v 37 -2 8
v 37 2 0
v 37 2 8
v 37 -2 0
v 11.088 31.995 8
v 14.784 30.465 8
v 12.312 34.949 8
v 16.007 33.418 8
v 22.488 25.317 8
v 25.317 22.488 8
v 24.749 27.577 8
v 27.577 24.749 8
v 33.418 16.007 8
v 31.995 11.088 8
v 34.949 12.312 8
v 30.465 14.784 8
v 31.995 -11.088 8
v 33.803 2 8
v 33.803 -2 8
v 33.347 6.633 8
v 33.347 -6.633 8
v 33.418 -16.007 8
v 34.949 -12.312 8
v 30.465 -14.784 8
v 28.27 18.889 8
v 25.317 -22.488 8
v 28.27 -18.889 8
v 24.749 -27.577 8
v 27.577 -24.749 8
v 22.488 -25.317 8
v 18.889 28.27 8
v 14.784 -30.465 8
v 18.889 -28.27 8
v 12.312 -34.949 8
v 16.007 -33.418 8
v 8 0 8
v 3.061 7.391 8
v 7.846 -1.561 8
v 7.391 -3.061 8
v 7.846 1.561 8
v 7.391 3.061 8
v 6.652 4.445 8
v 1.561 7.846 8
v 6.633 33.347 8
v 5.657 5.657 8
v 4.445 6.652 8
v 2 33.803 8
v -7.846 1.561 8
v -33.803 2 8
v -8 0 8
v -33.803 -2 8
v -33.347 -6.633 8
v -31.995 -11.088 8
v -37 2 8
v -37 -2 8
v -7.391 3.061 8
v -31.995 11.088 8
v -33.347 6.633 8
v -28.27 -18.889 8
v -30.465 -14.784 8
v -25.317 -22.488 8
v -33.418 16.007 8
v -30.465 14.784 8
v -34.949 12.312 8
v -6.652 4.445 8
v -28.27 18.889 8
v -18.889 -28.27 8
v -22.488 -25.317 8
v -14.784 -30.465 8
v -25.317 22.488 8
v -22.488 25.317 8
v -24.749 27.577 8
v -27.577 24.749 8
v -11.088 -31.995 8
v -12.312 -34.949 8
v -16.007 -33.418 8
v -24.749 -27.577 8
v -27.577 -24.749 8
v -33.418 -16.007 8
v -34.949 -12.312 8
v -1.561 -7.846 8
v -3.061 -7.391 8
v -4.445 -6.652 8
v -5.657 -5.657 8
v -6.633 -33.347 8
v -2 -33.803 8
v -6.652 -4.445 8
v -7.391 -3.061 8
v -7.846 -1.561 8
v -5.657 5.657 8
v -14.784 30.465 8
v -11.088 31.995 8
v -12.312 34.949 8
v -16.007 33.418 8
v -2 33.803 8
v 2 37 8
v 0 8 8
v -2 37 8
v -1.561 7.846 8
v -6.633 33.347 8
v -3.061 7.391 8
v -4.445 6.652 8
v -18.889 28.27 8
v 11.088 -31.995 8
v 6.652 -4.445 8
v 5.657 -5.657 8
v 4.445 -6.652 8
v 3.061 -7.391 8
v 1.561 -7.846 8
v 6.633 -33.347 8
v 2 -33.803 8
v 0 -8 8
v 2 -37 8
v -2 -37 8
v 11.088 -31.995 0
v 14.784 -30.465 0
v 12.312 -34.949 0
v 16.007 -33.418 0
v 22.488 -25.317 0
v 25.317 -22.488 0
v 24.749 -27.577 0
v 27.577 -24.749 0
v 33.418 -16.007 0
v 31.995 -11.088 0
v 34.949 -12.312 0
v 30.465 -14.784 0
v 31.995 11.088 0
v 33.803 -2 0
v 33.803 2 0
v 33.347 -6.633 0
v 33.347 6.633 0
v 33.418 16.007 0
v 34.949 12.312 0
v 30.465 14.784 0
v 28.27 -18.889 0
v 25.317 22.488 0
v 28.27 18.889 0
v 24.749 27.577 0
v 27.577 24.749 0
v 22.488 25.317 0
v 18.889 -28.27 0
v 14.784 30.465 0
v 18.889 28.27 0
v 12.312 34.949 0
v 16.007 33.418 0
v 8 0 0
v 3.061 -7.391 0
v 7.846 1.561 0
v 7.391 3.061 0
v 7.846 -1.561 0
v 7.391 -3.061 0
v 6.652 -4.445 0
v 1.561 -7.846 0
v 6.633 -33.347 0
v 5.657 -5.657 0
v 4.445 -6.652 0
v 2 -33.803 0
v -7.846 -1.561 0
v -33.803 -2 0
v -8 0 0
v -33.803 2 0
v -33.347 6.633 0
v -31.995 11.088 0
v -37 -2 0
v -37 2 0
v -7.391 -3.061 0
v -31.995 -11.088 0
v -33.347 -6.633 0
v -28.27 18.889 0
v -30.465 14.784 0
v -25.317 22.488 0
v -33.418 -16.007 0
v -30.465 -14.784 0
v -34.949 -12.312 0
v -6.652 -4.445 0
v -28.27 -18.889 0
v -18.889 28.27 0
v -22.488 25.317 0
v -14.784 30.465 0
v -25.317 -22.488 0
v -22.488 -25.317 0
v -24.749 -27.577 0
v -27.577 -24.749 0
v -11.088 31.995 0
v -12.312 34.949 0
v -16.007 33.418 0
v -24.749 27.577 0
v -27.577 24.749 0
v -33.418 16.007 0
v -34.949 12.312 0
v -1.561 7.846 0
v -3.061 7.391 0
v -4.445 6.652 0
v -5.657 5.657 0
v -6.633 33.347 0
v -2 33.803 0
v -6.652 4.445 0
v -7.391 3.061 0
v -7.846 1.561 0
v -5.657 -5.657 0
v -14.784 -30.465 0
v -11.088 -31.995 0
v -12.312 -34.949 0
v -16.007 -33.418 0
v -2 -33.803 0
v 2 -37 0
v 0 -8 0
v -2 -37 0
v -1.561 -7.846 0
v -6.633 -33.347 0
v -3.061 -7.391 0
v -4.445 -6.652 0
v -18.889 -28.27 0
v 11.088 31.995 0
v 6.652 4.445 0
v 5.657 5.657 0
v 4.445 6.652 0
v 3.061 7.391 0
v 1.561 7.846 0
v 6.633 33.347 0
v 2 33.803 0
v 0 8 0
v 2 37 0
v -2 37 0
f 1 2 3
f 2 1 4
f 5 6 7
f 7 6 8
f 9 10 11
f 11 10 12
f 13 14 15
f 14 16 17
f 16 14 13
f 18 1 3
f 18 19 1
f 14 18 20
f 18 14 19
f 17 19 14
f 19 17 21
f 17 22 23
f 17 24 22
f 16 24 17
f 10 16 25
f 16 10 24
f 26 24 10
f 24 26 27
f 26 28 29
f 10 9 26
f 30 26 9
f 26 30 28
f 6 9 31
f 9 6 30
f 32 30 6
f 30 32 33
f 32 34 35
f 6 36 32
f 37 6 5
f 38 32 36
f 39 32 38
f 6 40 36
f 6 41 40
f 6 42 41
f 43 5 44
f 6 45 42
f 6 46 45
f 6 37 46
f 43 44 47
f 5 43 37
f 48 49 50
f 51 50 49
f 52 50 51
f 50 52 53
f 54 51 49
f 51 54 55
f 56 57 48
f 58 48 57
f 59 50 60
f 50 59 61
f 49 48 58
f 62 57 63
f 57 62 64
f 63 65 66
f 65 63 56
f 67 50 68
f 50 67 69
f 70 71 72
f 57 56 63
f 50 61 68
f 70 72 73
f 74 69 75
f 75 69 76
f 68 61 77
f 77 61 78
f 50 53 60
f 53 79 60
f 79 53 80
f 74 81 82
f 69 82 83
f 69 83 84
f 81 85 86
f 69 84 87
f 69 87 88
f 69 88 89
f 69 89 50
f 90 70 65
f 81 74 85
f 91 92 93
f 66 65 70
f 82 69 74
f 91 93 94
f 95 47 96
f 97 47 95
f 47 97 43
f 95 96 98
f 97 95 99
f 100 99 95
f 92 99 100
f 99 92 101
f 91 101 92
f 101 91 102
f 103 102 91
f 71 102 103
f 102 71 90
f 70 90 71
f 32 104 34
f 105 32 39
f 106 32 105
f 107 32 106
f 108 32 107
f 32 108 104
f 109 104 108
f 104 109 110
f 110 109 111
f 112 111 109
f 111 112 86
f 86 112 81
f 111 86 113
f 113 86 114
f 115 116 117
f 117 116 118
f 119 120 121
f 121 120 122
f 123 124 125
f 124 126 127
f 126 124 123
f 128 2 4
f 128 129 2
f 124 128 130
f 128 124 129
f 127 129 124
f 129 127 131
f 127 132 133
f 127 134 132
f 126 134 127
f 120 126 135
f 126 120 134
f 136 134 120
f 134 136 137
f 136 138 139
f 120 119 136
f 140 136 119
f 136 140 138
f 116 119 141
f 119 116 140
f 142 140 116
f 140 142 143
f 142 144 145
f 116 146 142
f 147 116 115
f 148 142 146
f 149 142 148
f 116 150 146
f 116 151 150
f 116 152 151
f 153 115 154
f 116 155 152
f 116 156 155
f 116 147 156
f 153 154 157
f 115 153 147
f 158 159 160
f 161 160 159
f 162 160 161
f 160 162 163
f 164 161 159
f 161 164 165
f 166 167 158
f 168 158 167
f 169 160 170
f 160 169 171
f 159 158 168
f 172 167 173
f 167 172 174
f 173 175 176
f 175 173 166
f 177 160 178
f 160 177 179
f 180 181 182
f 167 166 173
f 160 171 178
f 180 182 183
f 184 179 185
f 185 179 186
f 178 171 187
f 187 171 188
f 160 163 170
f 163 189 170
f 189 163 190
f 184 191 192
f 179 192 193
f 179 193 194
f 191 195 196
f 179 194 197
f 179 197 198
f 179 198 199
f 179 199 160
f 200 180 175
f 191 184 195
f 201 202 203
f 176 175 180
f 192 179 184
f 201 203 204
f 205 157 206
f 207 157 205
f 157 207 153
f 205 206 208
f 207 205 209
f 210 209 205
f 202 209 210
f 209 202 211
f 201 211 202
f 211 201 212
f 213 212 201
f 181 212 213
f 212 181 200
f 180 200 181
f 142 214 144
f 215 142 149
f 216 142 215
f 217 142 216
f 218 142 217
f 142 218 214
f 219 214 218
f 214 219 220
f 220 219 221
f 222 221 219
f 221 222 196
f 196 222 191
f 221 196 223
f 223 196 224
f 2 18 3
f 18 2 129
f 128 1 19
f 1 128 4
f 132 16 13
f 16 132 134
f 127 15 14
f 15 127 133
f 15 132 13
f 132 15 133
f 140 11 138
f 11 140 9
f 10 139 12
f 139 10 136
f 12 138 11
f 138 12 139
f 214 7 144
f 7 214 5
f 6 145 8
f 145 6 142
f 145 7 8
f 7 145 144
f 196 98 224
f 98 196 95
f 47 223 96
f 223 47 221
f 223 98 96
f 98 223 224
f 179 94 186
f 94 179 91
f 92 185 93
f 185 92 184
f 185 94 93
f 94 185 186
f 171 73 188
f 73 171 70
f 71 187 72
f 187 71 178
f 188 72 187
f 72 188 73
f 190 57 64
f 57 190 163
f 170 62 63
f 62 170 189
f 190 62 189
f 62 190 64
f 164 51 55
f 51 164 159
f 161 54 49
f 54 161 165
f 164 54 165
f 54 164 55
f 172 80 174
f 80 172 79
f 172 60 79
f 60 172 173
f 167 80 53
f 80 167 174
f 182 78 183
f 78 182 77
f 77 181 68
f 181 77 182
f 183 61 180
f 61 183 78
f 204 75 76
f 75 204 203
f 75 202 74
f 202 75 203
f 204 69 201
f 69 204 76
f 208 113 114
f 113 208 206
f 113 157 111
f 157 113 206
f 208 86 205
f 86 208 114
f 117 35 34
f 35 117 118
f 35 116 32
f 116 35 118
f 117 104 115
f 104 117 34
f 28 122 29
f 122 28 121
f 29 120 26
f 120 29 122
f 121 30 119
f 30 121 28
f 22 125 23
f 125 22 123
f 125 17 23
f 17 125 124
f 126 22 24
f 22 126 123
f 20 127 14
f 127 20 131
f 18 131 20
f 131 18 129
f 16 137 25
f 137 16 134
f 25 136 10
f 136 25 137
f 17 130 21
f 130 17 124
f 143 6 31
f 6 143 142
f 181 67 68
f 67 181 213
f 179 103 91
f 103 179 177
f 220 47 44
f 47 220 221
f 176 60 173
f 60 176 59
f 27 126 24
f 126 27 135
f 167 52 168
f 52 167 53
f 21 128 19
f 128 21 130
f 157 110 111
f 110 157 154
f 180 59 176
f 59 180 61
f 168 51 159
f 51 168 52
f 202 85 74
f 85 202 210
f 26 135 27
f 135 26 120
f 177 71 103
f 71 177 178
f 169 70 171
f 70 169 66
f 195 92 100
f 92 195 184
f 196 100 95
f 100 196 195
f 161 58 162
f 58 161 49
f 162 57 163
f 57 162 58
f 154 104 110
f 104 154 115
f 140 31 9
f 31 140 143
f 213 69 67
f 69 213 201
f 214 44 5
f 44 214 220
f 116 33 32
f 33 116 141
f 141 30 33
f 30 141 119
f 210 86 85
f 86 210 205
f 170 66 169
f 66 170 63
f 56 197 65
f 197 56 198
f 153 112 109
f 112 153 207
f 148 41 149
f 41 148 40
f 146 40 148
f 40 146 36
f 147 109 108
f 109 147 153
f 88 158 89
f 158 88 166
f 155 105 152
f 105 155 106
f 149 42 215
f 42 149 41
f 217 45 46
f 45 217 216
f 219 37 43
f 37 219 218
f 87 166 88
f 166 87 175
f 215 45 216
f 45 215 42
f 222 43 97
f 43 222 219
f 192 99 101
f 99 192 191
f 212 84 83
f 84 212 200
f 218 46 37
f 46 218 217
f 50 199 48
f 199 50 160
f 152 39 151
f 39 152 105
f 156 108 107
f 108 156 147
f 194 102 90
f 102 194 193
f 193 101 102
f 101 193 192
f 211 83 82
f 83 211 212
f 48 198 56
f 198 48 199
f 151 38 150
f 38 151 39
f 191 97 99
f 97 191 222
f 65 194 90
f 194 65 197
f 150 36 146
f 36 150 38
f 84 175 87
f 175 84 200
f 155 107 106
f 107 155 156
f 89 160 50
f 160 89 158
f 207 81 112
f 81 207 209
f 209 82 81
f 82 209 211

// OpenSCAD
$fn = 32;

// ----------------------------------------------------------------------
// Spur blank: bored gear blank
// ----------------------------------------------------------------------

// --- parameters (mm) ---
disc_r = 34;              // blank root radius
disc_t = 8;               // blank thickness
n_teeth = 16;             // stub tooth count
tooth_w = 4;              // tooth width at the root
tooth_h = 3;              // tooth height above the root
bore_r = 8;               // central bore radius
fit_tol = 0.1;            // tolerance for press fits, mm
free_tol = 0.5;           // tolerance for clearance fits, mm

out_r = disc_r + tooth_h;  // tip radius
bbox_x = 74.0;  // measured width over the teeth
bbox_y = 74.0;  // measured depth over the teeth

difference() {
union() {
  cylinder(r = disc_r, h = disc_t);
  for (i = [0 : n_teeth - 1])
    rotate([0, 0, i * 360 / n_teeth])
      translate([disc_r - 1, -tooth_w / 2, 0])
        cube([tooth_h + 1, tooth_w, disc_t]);
}
  translate([0, 0, -1]) cylinder(r = bore_r, h = disc_t + 2);
}
